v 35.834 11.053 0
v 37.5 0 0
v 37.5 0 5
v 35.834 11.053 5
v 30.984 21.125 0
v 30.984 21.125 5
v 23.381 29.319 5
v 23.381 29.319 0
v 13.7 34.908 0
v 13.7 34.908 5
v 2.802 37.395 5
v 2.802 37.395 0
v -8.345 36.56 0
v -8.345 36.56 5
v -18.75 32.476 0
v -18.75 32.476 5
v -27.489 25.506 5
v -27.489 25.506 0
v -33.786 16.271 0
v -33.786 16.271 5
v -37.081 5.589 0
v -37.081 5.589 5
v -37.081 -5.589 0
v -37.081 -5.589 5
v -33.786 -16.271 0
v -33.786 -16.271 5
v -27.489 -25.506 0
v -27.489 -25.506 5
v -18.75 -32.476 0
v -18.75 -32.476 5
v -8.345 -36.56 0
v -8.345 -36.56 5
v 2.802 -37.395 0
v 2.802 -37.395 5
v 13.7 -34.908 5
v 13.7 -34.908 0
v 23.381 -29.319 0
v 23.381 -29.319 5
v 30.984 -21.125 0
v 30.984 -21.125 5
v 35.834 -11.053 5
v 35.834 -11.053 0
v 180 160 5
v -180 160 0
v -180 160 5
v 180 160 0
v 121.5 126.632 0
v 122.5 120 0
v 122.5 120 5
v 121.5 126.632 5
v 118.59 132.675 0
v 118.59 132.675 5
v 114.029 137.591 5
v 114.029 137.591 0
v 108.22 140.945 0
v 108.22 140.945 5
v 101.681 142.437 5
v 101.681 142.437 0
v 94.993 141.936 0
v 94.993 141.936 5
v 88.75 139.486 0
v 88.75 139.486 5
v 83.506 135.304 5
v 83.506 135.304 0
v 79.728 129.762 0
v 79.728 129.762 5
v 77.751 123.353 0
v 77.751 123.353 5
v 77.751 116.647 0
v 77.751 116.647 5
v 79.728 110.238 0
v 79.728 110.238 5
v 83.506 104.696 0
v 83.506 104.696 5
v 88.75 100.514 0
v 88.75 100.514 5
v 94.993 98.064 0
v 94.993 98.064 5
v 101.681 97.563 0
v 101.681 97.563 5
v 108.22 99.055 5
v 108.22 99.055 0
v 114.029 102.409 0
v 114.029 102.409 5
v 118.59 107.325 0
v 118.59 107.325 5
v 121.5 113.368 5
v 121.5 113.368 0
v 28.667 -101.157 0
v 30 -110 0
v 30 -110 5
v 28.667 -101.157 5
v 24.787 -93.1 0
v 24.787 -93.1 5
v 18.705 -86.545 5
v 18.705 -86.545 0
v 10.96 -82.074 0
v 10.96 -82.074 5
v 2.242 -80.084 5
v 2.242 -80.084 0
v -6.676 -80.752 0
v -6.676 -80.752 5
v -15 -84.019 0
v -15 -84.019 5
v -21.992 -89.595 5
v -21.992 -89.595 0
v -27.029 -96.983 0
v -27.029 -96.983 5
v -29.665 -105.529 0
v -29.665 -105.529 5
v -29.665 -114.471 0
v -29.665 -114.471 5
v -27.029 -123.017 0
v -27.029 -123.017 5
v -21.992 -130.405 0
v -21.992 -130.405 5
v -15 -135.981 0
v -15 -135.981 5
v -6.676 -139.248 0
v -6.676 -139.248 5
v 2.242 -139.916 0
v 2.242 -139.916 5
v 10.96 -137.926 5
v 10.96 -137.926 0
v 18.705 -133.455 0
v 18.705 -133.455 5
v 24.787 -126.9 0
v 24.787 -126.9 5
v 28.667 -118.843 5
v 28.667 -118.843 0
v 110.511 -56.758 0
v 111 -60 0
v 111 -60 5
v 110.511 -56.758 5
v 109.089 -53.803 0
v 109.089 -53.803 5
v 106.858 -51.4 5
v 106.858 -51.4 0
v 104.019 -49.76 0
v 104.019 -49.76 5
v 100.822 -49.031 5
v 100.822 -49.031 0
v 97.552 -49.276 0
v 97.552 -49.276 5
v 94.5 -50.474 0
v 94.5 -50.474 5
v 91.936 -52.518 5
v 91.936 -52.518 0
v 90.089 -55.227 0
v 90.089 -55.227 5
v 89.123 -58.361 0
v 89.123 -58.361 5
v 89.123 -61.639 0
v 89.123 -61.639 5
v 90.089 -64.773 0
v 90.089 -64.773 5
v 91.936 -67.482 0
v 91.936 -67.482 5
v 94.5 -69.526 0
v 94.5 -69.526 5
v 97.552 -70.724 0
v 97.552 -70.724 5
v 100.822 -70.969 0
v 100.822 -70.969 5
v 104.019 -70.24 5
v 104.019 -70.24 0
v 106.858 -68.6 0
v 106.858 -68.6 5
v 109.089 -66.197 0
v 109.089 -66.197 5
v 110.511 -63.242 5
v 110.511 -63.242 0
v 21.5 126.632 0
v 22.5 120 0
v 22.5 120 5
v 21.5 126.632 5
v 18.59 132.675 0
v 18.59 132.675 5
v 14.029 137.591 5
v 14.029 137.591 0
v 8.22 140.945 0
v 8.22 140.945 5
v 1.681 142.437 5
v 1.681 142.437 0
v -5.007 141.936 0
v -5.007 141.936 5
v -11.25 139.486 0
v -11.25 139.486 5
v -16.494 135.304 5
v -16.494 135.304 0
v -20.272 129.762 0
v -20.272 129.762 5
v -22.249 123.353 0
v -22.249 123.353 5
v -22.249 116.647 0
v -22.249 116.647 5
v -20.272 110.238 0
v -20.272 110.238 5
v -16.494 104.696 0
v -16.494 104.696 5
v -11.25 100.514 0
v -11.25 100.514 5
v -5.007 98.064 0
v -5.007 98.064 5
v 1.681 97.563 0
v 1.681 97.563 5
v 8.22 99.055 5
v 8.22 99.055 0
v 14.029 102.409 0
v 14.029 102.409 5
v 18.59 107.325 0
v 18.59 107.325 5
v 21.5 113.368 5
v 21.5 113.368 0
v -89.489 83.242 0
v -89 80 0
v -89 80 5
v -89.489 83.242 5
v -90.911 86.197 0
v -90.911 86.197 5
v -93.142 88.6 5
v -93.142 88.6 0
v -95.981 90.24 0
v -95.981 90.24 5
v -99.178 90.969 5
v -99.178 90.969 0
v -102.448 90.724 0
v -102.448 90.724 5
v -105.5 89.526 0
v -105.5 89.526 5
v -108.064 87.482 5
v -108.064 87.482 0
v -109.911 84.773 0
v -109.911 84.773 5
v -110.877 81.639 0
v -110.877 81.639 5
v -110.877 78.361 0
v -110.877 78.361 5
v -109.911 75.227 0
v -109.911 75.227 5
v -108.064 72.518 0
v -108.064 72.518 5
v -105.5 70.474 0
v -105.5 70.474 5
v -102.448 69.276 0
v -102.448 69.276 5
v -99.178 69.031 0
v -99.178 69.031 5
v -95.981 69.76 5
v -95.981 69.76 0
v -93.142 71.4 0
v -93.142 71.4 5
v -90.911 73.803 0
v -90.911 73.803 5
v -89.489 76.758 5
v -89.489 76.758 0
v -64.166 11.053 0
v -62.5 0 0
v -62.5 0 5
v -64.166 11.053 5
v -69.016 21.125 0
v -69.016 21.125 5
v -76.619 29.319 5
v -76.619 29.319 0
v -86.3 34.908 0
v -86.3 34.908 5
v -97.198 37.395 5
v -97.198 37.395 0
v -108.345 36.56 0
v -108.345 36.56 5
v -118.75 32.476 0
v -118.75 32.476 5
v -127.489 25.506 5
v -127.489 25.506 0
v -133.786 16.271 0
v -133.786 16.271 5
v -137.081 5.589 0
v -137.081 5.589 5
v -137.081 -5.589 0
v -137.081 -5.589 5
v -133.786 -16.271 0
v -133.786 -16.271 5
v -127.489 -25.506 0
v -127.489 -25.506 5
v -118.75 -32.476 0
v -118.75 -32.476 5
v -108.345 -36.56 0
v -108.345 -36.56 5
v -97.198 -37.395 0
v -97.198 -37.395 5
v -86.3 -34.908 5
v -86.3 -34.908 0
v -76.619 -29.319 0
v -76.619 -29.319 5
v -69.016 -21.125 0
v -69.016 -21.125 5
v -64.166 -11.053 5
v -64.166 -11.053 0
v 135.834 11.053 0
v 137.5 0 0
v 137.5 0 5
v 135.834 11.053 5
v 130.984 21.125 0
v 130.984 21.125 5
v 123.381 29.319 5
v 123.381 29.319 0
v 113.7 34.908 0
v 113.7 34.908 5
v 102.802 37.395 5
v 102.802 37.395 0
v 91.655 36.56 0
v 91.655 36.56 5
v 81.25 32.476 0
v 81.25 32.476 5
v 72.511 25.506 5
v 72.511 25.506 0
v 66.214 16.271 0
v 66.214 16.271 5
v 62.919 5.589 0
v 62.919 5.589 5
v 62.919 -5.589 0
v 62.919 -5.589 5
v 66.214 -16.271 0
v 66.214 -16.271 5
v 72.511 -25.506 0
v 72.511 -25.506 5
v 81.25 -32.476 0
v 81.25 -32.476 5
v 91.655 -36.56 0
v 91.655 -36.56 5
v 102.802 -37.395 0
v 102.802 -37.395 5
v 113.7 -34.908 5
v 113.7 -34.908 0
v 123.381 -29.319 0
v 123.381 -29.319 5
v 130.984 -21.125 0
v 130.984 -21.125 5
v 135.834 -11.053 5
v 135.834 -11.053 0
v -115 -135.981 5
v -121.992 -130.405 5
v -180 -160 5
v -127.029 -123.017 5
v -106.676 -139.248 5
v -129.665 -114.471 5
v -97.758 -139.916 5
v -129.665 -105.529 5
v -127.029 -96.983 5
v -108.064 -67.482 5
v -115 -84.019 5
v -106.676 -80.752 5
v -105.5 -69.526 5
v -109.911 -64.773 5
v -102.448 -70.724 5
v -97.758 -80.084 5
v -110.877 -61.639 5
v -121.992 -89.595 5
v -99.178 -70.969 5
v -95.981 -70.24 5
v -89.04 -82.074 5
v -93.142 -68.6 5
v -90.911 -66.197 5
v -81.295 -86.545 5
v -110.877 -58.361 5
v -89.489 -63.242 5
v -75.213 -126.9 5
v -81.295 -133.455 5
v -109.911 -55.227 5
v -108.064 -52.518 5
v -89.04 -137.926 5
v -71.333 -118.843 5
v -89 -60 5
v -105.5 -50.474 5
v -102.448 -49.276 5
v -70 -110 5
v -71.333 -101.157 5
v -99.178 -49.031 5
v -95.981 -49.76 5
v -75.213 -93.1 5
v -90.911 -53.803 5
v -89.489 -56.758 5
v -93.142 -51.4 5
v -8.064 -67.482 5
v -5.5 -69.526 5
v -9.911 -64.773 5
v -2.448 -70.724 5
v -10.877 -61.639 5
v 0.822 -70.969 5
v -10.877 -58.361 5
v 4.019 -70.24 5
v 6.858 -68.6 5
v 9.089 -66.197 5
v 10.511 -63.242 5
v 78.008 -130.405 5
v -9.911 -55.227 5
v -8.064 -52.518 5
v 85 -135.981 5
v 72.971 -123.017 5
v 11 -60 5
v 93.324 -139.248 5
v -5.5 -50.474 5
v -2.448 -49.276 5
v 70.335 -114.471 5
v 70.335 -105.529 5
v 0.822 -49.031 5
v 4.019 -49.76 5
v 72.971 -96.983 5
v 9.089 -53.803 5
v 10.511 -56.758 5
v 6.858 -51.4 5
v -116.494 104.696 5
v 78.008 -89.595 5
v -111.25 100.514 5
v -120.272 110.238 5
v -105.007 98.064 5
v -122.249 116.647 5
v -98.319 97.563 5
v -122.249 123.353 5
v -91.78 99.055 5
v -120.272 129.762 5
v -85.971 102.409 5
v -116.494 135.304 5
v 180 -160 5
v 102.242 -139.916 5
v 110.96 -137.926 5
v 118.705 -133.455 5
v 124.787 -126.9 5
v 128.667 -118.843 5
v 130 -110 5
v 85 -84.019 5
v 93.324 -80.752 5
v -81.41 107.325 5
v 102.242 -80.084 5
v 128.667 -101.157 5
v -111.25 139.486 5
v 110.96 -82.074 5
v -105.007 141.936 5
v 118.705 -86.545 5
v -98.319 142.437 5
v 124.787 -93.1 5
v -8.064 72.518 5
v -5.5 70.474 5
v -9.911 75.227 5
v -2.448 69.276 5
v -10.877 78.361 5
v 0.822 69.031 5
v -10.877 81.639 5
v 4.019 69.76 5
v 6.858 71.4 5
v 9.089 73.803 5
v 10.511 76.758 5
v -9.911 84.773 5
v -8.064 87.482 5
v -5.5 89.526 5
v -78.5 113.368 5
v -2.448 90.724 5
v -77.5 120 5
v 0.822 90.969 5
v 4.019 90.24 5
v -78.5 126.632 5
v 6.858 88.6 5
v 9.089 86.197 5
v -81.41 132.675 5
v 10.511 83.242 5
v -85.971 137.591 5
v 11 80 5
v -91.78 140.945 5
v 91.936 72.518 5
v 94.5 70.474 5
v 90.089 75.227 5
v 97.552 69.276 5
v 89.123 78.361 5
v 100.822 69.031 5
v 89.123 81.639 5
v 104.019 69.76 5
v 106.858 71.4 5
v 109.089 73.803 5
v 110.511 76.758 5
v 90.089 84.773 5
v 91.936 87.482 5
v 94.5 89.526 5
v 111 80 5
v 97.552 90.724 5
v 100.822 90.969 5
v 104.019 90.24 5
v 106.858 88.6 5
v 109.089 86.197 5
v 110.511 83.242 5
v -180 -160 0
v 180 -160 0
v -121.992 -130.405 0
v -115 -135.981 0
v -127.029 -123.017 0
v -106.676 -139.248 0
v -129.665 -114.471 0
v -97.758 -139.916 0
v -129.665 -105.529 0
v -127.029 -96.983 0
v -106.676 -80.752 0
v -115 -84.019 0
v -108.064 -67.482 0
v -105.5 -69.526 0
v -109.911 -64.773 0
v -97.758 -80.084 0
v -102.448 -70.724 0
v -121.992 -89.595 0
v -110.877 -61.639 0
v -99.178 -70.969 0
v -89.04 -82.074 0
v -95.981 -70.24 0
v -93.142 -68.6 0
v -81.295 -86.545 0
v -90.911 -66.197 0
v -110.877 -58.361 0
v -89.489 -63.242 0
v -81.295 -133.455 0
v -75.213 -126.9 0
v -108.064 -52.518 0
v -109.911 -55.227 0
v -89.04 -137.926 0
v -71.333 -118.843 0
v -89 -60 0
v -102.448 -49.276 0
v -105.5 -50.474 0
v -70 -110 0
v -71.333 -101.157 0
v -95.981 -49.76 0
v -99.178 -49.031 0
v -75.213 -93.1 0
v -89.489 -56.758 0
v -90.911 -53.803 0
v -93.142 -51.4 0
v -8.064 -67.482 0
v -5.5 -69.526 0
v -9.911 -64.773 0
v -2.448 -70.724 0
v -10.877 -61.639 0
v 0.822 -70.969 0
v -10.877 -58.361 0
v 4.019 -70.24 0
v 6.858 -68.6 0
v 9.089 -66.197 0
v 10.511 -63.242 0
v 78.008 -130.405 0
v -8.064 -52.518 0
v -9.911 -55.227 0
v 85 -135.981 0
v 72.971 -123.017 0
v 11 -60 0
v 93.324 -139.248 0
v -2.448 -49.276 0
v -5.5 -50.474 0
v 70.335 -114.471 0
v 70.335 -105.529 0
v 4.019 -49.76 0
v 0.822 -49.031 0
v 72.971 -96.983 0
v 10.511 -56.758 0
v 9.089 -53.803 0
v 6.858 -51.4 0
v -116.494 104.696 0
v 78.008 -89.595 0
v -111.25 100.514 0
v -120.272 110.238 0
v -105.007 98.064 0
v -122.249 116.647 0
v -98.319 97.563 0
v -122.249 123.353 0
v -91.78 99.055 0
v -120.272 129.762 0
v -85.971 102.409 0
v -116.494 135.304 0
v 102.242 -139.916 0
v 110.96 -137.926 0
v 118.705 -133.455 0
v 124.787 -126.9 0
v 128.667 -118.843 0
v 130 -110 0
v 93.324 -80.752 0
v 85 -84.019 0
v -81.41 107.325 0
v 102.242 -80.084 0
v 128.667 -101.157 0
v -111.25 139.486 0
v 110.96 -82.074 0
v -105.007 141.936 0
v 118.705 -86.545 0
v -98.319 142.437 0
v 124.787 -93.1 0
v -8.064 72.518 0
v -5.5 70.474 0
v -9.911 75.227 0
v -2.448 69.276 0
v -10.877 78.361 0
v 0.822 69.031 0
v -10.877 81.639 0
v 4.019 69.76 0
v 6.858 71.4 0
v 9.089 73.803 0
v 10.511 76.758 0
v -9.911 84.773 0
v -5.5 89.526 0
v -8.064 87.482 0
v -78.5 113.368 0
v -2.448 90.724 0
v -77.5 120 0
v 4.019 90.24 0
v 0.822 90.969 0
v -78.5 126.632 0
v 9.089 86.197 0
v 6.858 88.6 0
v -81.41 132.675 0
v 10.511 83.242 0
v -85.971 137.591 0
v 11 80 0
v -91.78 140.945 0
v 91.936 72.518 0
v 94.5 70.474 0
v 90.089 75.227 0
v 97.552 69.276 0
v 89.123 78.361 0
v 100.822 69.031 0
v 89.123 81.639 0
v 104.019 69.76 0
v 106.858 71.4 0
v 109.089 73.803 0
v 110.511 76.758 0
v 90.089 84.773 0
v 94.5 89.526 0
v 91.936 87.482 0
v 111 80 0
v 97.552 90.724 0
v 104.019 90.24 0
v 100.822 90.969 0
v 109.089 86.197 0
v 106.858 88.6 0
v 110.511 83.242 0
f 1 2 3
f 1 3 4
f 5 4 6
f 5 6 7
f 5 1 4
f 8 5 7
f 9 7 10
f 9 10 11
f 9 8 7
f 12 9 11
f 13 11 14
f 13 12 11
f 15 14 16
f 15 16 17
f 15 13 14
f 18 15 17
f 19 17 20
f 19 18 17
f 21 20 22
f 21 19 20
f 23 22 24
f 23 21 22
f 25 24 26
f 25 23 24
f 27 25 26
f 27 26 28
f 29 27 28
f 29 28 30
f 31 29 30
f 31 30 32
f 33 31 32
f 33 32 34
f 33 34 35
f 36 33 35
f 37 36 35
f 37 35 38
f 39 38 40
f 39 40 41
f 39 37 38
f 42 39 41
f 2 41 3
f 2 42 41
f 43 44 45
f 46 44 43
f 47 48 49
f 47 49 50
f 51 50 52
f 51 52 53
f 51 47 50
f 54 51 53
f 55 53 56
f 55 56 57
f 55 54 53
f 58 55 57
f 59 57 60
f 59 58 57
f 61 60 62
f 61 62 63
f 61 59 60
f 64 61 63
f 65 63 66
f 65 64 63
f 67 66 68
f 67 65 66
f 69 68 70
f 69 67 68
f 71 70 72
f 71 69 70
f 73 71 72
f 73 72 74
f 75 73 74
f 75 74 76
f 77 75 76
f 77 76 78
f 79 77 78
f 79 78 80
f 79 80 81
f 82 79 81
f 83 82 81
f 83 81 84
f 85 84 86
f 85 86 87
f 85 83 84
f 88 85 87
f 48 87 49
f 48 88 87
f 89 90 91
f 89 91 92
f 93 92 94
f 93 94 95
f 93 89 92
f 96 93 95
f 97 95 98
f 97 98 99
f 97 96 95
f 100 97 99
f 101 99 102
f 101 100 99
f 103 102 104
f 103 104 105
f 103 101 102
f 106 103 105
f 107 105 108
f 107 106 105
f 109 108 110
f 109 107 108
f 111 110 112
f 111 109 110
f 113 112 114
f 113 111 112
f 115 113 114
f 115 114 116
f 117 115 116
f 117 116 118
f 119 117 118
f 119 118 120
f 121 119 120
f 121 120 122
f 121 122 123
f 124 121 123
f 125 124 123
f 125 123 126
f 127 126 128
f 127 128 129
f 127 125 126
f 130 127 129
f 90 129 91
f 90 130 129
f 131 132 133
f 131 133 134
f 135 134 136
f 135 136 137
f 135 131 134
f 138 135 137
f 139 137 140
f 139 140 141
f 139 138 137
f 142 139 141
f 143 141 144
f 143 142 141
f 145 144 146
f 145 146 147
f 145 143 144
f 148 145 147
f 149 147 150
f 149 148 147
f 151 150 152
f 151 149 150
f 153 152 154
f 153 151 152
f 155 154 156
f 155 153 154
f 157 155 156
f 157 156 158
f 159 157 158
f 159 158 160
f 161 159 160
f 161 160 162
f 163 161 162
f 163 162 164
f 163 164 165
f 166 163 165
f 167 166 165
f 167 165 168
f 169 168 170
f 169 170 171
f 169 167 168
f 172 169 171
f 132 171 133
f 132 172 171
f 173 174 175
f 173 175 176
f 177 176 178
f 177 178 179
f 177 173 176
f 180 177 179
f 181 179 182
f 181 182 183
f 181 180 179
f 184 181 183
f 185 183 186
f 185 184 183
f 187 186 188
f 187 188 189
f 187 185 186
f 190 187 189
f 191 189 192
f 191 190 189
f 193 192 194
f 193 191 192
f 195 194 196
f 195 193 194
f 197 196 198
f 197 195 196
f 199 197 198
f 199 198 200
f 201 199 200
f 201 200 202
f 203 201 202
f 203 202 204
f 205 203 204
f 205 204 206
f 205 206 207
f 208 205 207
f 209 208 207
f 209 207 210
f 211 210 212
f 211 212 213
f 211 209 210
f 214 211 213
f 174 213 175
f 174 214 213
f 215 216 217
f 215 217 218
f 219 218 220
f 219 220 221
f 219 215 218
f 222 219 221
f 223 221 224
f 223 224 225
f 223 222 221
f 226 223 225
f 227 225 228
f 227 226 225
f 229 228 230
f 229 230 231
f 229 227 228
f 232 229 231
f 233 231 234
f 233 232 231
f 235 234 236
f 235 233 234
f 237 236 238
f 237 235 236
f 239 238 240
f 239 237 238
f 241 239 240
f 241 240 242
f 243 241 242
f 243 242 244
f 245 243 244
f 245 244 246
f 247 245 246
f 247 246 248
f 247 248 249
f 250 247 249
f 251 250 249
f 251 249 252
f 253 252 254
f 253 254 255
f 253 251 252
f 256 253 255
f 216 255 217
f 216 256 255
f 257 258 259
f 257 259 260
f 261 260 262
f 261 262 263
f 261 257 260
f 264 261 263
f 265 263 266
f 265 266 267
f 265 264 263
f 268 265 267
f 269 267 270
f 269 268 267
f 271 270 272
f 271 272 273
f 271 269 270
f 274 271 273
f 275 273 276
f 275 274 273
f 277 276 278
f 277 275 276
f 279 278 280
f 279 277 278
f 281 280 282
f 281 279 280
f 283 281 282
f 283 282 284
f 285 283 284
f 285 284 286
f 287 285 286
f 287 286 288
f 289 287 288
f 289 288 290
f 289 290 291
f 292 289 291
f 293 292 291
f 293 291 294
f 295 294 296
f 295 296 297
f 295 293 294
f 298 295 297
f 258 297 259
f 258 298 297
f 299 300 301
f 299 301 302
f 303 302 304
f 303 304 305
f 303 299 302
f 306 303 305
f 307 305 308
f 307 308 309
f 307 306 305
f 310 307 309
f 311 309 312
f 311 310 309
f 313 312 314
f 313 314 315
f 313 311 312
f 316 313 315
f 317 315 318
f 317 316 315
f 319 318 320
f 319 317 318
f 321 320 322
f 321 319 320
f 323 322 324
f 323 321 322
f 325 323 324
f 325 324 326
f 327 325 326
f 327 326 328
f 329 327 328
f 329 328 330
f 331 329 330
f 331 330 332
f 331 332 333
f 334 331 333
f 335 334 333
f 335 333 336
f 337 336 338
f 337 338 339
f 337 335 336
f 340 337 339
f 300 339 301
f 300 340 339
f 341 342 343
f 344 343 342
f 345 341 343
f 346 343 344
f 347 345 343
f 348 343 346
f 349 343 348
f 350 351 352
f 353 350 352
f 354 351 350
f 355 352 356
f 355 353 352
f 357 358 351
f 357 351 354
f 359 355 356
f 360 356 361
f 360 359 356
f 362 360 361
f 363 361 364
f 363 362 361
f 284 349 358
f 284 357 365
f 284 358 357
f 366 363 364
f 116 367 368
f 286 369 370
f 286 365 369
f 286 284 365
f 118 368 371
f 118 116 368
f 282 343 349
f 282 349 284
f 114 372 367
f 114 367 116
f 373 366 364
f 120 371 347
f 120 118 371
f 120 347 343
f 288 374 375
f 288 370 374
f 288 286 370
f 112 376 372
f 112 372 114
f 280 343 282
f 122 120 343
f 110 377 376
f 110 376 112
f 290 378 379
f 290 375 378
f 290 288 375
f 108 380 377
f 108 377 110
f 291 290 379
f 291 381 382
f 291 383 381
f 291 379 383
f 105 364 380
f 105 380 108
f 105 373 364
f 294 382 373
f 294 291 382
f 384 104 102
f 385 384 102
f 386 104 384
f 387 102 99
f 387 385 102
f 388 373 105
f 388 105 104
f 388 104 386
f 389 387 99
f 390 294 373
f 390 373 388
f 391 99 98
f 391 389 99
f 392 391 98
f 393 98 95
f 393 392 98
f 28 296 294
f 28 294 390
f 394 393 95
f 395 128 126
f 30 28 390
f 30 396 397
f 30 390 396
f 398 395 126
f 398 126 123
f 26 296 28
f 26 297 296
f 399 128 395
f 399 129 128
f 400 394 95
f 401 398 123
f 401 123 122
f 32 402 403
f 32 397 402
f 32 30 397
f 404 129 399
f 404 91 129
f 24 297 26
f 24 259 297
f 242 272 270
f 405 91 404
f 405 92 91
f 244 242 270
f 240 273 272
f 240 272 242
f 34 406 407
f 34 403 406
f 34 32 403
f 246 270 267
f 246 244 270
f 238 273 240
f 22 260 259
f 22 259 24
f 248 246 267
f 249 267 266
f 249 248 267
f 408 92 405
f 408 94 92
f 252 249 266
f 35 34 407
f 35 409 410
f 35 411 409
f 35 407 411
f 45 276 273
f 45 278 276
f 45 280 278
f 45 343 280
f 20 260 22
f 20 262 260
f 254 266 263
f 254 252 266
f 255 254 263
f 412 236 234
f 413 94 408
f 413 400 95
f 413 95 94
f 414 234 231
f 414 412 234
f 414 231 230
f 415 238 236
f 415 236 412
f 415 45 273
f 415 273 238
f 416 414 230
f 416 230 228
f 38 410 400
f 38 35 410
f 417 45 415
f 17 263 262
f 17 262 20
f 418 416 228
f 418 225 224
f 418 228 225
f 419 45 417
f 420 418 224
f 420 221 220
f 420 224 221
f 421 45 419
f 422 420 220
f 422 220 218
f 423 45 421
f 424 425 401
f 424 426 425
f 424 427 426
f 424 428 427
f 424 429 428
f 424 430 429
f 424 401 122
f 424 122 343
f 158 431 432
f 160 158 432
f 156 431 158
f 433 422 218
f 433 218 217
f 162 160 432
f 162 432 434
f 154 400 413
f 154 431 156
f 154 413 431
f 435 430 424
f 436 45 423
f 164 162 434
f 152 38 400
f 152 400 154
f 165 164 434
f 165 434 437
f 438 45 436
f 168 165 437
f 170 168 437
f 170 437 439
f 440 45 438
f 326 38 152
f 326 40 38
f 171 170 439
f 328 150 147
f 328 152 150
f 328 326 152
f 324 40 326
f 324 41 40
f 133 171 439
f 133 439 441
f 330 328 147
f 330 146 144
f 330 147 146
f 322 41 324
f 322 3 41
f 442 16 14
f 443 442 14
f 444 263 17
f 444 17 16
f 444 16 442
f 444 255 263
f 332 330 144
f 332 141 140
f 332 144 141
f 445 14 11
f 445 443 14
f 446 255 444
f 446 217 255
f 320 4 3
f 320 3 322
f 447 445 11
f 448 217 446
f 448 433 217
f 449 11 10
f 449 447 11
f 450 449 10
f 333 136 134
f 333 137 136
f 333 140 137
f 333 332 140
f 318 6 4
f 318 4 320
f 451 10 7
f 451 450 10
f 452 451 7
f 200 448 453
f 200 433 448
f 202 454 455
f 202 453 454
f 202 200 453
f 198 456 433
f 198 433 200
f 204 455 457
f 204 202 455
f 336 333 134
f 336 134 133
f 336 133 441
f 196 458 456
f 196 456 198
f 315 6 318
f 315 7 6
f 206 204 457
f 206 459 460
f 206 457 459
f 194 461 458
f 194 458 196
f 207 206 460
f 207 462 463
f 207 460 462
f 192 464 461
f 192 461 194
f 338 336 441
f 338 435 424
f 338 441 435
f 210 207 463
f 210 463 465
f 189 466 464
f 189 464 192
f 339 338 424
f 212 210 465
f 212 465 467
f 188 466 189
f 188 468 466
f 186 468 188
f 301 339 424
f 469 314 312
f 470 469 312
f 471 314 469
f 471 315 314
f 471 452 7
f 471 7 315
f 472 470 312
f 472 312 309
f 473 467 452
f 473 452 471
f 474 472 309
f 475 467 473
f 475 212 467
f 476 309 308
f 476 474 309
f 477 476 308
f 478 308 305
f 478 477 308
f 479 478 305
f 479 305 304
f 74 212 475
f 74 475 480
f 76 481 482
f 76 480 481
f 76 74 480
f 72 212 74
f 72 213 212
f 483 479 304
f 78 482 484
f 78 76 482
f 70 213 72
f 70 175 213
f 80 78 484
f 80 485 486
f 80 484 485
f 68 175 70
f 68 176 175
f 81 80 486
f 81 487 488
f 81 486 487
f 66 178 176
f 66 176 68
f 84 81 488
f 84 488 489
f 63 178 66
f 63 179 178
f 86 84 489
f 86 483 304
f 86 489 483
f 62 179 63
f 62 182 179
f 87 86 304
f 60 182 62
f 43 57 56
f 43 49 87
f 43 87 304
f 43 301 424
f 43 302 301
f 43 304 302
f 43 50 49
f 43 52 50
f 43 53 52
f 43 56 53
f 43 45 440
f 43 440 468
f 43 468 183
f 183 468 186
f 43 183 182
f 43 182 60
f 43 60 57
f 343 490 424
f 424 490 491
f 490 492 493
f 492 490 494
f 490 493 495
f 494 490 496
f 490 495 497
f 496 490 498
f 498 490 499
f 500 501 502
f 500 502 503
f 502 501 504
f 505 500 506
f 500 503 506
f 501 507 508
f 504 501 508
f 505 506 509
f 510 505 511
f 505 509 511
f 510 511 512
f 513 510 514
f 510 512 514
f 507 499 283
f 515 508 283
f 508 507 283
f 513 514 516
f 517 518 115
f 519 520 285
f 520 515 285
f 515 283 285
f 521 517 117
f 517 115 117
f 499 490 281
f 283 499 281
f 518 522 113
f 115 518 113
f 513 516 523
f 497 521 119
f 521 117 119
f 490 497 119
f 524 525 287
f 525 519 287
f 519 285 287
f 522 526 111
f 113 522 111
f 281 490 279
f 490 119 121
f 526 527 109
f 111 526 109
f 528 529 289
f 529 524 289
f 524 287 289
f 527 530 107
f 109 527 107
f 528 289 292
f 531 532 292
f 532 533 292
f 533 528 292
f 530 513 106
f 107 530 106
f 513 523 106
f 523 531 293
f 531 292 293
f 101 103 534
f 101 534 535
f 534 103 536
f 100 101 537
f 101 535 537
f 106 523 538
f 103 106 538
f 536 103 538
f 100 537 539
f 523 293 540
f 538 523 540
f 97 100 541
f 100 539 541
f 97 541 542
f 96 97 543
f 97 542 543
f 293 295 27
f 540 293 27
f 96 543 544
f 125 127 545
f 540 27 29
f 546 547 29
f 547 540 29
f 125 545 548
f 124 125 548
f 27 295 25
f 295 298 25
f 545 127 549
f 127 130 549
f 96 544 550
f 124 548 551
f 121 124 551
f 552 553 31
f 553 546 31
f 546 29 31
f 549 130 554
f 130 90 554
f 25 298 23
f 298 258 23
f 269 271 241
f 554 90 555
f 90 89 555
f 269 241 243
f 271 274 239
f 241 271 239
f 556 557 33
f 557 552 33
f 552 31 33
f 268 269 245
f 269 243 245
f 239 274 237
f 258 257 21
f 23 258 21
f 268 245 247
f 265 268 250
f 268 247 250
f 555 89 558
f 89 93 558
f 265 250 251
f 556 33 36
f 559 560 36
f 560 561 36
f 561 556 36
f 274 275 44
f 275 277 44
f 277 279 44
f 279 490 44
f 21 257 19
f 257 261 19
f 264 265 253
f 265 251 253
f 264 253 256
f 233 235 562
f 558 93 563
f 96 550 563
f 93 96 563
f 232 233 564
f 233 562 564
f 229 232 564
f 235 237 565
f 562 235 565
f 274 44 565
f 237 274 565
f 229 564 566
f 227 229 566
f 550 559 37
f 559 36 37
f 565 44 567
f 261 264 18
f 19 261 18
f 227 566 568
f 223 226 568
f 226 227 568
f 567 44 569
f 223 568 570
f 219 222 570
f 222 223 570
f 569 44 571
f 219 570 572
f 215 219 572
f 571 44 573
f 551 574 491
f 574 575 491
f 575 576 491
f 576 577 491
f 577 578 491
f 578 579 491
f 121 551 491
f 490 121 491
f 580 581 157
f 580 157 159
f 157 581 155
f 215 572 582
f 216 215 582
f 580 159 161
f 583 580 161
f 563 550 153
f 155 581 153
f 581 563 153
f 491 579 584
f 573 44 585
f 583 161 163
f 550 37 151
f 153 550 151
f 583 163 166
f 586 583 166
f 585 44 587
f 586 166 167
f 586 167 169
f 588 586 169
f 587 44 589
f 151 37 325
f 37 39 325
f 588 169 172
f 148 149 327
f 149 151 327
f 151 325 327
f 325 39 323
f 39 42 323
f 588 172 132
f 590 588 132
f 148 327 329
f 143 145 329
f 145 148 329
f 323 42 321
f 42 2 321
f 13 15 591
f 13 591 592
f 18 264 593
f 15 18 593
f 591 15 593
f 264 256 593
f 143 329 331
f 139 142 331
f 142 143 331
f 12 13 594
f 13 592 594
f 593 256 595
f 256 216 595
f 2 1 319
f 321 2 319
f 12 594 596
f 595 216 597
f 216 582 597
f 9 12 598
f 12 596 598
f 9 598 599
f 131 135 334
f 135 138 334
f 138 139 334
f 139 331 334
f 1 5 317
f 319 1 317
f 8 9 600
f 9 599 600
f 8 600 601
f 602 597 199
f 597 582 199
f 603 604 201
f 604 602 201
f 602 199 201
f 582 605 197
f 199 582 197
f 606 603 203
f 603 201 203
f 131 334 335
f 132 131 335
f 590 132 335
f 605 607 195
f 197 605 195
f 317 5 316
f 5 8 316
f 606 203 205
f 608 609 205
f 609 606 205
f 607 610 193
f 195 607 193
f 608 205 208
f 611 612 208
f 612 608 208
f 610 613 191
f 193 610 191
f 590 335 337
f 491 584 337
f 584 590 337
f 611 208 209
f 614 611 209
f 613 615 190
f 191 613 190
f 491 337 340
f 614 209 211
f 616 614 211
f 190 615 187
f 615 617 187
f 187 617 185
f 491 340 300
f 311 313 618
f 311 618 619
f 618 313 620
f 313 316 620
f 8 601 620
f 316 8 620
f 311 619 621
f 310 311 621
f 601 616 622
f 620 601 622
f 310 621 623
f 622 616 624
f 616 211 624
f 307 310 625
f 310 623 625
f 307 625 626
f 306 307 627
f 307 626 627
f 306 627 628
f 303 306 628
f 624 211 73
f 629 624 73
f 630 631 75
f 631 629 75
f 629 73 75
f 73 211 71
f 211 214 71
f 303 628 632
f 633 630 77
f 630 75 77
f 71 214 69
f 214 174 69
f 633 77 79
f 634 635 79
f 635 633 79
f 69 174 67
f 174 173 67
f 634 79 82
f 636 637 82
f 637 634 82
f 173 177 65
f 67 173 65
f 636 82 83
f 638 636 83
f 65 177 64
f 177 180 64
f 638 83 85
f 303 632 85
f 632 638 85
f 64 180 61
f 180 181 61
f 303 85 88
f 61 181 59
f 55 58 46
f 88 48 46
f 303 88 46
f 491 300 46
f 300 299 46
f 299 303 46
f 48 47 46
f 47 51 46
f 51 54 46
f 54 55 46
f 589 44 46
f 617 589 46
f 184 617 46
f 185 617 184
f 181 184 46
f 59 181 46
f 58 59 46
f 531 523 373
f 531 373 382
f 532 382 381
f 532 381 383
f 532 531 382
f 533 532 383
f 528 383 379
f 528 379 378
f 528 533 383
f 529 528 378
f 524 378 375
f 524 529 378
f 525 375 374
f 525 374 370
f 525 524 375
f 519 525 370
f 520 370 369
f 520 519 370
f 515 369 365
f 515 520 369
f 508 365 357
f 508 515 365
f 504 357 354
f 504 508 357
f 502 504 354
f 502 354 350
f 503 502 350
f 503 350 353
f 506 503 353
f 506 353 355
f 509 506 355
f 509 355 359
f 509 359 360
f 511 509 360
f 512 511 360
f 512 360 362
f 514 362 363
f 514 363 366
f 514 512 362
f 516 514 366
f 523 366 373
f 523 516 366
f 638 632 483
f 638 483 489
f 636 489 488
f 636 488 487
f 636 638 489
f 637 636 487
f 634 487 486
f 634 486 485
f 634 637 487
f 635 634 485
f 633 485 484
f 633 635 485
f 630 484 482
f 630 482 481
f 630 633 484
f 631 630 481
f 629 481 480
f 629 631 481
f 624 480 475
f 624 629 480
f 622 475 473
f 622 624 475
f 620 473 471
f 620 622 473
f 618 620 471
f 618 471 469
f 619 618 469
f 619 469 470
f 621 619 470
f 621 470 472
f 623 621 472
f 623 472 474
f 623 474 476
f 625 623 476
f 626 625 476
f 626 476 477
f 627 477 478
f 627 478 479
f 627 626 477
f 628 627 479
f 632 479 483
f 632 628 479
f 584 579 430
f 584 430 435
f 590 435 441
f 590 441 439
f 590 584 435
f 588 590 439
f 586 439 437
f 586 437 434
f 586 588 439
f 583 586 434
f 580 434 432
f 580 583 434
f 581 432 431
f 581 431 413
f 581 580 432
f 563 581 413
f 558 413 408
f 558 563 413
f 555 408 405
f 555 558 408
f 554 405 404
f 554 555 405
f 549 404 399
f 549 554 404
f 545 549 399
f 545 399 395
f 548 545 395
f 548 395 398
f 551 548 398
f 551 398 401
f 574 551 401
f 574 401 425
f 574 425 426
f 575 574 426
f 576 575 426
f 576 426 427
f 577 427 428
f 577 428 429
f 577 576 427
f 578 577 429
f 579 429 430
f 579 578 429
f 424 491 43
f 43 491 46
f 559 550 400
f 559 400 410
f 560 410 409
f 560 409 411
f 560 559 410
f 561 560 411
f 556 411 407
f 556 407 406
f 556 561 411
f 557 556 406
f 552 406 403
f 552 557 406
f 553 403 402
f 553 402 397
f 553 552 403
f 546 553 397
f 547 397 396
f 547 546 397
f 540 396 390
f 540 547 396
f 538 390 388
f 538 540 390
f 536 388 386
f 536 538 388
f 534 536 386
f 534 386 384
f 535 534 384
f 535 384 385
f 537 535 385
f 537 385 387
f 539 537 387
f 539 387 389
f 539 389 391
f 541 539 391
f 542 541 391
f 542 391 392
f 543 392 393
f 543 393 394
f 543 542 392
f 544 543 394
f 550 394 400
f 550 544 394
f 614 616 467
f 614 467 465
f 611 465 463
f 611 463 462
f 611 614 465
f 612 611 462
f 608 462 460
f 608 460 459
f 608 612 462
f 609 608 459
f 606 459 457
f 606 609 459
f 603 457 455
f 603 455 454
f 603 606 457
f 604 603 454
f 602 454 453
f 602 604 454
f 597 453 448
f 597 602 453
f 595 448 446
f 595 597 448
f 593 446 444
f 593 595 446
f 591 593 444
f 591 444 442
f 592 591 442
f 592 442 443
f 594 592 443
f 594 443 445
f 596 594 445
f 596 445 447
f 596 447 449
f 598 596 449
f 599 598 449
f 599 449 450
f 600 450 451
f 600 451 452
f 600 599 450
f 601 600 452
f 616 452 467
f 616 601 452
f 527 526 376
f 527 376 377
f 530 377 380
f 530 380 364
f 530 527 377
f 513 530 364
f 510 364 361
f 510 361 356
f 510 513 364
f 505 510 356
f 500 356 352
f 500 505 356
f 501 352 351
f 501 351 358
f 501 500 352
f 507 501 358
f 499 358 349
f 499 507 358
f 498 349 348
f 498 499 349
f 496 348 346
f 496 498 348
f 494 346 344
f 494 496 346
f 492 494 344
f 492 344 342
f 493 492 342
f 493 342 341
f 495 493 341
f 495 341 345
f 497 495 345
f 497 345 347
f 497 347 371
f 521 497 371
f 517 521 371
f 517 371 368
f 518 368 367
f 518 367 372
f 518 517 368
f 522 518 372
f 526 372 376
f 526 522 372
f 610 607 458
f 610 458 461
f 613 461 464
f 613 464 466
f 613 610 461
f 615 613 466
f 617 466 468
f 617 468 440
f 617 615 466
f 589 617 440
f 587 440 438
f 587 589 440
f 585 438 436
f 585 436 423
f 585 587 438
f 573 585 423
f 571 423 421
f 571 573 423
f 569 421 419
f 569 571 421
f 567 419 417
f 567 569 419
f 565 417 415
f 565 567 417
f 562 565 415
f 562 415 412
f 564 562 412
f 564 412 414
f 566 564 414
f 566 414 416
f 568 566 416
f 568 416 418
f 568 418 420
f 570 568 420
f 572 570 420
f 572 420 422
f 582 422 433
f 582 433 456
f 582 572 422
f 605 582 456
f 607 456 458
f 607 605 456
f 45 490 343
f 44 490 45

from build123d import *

# Parameters (mm, degrees)
ESBO_O1_W                = 360
ESBO_O1_H                = 320
ESBO_O1_R                = 11
ESBO_O1_R_2              = 37.5
ESBO_O1_R_3              = 30
ESBO_O1_R_4              = 22.5
RESSALTO_EXTRUS_O1_DEPTH = 5


with BuildPart() as part:
    # Esboço1 → Ressalto-extrusão1 (new body)
    with BuildSketch(Plane.XY):
        Rectangle(ESBO_O1_W, ESBO_O1_H)
        with Locations((0, 80)):
            Circle(ESBO_O1_R, mode=Mode.SUBTRACT)
        with Locations((-100, 80)):
            Circle(ESBO_O1_R, mode=Mode.SUBTRACT)
        with Locations((100, 80)):
            Circle(ESBO_O1_R, mode=Mode.SUBTRACT)
        with Locations((0, -60)):
            Circle(ESBO_O1_R, mode=Mode.SUBTRACT)
        with Locations((100, -60)):
            Circle(ESBO_O1_R, mode=Mode.SUBTRACT)
        with Locations((-100, -60)):
            Circle(ESBO_O1_R, mode=Mode.SUBTRACT)
        with Locations((-100, 0)):
            Circle(ESBO_O1_R_2, mode=Mode.SUBTRACT)
        Circle(ESBO_O1_R_2, mode=Mode.SUBTRACT)
        with Locations((100, 0)):
            Circle(ESBO_O1_R_2, mode=Mode.SUBTRACT)
        with Locations((100, -110)):
            Circle(ESBO_O1_R_3, mode=Mode.SUBTRACT)
        with Locations((0, -110)):
            Circle(ESBO_O1_R_3, mode=Mode.SUBTRACT)
        with Locations((-100, -110)):
            Circle(ESBO_O1_R_3, mode=Mode.SUBTRACT)
        with Locations((-100, 120)):
            Circle(ESBO_O1_R_4, mode=Mode.SUBTRACT)
        with Locations((0, 120)):
            Circle(ESBO_O1_R_4, mode=Mode.SUBTRACT)
        with Locations((100, 120)):
            Circle(ESBO_O1_R_4, mode=Mode.SUBTRACT)
    extrude(amount=RESSALTO_EXTRUS_O1_DEPTH)


solid = part.part
